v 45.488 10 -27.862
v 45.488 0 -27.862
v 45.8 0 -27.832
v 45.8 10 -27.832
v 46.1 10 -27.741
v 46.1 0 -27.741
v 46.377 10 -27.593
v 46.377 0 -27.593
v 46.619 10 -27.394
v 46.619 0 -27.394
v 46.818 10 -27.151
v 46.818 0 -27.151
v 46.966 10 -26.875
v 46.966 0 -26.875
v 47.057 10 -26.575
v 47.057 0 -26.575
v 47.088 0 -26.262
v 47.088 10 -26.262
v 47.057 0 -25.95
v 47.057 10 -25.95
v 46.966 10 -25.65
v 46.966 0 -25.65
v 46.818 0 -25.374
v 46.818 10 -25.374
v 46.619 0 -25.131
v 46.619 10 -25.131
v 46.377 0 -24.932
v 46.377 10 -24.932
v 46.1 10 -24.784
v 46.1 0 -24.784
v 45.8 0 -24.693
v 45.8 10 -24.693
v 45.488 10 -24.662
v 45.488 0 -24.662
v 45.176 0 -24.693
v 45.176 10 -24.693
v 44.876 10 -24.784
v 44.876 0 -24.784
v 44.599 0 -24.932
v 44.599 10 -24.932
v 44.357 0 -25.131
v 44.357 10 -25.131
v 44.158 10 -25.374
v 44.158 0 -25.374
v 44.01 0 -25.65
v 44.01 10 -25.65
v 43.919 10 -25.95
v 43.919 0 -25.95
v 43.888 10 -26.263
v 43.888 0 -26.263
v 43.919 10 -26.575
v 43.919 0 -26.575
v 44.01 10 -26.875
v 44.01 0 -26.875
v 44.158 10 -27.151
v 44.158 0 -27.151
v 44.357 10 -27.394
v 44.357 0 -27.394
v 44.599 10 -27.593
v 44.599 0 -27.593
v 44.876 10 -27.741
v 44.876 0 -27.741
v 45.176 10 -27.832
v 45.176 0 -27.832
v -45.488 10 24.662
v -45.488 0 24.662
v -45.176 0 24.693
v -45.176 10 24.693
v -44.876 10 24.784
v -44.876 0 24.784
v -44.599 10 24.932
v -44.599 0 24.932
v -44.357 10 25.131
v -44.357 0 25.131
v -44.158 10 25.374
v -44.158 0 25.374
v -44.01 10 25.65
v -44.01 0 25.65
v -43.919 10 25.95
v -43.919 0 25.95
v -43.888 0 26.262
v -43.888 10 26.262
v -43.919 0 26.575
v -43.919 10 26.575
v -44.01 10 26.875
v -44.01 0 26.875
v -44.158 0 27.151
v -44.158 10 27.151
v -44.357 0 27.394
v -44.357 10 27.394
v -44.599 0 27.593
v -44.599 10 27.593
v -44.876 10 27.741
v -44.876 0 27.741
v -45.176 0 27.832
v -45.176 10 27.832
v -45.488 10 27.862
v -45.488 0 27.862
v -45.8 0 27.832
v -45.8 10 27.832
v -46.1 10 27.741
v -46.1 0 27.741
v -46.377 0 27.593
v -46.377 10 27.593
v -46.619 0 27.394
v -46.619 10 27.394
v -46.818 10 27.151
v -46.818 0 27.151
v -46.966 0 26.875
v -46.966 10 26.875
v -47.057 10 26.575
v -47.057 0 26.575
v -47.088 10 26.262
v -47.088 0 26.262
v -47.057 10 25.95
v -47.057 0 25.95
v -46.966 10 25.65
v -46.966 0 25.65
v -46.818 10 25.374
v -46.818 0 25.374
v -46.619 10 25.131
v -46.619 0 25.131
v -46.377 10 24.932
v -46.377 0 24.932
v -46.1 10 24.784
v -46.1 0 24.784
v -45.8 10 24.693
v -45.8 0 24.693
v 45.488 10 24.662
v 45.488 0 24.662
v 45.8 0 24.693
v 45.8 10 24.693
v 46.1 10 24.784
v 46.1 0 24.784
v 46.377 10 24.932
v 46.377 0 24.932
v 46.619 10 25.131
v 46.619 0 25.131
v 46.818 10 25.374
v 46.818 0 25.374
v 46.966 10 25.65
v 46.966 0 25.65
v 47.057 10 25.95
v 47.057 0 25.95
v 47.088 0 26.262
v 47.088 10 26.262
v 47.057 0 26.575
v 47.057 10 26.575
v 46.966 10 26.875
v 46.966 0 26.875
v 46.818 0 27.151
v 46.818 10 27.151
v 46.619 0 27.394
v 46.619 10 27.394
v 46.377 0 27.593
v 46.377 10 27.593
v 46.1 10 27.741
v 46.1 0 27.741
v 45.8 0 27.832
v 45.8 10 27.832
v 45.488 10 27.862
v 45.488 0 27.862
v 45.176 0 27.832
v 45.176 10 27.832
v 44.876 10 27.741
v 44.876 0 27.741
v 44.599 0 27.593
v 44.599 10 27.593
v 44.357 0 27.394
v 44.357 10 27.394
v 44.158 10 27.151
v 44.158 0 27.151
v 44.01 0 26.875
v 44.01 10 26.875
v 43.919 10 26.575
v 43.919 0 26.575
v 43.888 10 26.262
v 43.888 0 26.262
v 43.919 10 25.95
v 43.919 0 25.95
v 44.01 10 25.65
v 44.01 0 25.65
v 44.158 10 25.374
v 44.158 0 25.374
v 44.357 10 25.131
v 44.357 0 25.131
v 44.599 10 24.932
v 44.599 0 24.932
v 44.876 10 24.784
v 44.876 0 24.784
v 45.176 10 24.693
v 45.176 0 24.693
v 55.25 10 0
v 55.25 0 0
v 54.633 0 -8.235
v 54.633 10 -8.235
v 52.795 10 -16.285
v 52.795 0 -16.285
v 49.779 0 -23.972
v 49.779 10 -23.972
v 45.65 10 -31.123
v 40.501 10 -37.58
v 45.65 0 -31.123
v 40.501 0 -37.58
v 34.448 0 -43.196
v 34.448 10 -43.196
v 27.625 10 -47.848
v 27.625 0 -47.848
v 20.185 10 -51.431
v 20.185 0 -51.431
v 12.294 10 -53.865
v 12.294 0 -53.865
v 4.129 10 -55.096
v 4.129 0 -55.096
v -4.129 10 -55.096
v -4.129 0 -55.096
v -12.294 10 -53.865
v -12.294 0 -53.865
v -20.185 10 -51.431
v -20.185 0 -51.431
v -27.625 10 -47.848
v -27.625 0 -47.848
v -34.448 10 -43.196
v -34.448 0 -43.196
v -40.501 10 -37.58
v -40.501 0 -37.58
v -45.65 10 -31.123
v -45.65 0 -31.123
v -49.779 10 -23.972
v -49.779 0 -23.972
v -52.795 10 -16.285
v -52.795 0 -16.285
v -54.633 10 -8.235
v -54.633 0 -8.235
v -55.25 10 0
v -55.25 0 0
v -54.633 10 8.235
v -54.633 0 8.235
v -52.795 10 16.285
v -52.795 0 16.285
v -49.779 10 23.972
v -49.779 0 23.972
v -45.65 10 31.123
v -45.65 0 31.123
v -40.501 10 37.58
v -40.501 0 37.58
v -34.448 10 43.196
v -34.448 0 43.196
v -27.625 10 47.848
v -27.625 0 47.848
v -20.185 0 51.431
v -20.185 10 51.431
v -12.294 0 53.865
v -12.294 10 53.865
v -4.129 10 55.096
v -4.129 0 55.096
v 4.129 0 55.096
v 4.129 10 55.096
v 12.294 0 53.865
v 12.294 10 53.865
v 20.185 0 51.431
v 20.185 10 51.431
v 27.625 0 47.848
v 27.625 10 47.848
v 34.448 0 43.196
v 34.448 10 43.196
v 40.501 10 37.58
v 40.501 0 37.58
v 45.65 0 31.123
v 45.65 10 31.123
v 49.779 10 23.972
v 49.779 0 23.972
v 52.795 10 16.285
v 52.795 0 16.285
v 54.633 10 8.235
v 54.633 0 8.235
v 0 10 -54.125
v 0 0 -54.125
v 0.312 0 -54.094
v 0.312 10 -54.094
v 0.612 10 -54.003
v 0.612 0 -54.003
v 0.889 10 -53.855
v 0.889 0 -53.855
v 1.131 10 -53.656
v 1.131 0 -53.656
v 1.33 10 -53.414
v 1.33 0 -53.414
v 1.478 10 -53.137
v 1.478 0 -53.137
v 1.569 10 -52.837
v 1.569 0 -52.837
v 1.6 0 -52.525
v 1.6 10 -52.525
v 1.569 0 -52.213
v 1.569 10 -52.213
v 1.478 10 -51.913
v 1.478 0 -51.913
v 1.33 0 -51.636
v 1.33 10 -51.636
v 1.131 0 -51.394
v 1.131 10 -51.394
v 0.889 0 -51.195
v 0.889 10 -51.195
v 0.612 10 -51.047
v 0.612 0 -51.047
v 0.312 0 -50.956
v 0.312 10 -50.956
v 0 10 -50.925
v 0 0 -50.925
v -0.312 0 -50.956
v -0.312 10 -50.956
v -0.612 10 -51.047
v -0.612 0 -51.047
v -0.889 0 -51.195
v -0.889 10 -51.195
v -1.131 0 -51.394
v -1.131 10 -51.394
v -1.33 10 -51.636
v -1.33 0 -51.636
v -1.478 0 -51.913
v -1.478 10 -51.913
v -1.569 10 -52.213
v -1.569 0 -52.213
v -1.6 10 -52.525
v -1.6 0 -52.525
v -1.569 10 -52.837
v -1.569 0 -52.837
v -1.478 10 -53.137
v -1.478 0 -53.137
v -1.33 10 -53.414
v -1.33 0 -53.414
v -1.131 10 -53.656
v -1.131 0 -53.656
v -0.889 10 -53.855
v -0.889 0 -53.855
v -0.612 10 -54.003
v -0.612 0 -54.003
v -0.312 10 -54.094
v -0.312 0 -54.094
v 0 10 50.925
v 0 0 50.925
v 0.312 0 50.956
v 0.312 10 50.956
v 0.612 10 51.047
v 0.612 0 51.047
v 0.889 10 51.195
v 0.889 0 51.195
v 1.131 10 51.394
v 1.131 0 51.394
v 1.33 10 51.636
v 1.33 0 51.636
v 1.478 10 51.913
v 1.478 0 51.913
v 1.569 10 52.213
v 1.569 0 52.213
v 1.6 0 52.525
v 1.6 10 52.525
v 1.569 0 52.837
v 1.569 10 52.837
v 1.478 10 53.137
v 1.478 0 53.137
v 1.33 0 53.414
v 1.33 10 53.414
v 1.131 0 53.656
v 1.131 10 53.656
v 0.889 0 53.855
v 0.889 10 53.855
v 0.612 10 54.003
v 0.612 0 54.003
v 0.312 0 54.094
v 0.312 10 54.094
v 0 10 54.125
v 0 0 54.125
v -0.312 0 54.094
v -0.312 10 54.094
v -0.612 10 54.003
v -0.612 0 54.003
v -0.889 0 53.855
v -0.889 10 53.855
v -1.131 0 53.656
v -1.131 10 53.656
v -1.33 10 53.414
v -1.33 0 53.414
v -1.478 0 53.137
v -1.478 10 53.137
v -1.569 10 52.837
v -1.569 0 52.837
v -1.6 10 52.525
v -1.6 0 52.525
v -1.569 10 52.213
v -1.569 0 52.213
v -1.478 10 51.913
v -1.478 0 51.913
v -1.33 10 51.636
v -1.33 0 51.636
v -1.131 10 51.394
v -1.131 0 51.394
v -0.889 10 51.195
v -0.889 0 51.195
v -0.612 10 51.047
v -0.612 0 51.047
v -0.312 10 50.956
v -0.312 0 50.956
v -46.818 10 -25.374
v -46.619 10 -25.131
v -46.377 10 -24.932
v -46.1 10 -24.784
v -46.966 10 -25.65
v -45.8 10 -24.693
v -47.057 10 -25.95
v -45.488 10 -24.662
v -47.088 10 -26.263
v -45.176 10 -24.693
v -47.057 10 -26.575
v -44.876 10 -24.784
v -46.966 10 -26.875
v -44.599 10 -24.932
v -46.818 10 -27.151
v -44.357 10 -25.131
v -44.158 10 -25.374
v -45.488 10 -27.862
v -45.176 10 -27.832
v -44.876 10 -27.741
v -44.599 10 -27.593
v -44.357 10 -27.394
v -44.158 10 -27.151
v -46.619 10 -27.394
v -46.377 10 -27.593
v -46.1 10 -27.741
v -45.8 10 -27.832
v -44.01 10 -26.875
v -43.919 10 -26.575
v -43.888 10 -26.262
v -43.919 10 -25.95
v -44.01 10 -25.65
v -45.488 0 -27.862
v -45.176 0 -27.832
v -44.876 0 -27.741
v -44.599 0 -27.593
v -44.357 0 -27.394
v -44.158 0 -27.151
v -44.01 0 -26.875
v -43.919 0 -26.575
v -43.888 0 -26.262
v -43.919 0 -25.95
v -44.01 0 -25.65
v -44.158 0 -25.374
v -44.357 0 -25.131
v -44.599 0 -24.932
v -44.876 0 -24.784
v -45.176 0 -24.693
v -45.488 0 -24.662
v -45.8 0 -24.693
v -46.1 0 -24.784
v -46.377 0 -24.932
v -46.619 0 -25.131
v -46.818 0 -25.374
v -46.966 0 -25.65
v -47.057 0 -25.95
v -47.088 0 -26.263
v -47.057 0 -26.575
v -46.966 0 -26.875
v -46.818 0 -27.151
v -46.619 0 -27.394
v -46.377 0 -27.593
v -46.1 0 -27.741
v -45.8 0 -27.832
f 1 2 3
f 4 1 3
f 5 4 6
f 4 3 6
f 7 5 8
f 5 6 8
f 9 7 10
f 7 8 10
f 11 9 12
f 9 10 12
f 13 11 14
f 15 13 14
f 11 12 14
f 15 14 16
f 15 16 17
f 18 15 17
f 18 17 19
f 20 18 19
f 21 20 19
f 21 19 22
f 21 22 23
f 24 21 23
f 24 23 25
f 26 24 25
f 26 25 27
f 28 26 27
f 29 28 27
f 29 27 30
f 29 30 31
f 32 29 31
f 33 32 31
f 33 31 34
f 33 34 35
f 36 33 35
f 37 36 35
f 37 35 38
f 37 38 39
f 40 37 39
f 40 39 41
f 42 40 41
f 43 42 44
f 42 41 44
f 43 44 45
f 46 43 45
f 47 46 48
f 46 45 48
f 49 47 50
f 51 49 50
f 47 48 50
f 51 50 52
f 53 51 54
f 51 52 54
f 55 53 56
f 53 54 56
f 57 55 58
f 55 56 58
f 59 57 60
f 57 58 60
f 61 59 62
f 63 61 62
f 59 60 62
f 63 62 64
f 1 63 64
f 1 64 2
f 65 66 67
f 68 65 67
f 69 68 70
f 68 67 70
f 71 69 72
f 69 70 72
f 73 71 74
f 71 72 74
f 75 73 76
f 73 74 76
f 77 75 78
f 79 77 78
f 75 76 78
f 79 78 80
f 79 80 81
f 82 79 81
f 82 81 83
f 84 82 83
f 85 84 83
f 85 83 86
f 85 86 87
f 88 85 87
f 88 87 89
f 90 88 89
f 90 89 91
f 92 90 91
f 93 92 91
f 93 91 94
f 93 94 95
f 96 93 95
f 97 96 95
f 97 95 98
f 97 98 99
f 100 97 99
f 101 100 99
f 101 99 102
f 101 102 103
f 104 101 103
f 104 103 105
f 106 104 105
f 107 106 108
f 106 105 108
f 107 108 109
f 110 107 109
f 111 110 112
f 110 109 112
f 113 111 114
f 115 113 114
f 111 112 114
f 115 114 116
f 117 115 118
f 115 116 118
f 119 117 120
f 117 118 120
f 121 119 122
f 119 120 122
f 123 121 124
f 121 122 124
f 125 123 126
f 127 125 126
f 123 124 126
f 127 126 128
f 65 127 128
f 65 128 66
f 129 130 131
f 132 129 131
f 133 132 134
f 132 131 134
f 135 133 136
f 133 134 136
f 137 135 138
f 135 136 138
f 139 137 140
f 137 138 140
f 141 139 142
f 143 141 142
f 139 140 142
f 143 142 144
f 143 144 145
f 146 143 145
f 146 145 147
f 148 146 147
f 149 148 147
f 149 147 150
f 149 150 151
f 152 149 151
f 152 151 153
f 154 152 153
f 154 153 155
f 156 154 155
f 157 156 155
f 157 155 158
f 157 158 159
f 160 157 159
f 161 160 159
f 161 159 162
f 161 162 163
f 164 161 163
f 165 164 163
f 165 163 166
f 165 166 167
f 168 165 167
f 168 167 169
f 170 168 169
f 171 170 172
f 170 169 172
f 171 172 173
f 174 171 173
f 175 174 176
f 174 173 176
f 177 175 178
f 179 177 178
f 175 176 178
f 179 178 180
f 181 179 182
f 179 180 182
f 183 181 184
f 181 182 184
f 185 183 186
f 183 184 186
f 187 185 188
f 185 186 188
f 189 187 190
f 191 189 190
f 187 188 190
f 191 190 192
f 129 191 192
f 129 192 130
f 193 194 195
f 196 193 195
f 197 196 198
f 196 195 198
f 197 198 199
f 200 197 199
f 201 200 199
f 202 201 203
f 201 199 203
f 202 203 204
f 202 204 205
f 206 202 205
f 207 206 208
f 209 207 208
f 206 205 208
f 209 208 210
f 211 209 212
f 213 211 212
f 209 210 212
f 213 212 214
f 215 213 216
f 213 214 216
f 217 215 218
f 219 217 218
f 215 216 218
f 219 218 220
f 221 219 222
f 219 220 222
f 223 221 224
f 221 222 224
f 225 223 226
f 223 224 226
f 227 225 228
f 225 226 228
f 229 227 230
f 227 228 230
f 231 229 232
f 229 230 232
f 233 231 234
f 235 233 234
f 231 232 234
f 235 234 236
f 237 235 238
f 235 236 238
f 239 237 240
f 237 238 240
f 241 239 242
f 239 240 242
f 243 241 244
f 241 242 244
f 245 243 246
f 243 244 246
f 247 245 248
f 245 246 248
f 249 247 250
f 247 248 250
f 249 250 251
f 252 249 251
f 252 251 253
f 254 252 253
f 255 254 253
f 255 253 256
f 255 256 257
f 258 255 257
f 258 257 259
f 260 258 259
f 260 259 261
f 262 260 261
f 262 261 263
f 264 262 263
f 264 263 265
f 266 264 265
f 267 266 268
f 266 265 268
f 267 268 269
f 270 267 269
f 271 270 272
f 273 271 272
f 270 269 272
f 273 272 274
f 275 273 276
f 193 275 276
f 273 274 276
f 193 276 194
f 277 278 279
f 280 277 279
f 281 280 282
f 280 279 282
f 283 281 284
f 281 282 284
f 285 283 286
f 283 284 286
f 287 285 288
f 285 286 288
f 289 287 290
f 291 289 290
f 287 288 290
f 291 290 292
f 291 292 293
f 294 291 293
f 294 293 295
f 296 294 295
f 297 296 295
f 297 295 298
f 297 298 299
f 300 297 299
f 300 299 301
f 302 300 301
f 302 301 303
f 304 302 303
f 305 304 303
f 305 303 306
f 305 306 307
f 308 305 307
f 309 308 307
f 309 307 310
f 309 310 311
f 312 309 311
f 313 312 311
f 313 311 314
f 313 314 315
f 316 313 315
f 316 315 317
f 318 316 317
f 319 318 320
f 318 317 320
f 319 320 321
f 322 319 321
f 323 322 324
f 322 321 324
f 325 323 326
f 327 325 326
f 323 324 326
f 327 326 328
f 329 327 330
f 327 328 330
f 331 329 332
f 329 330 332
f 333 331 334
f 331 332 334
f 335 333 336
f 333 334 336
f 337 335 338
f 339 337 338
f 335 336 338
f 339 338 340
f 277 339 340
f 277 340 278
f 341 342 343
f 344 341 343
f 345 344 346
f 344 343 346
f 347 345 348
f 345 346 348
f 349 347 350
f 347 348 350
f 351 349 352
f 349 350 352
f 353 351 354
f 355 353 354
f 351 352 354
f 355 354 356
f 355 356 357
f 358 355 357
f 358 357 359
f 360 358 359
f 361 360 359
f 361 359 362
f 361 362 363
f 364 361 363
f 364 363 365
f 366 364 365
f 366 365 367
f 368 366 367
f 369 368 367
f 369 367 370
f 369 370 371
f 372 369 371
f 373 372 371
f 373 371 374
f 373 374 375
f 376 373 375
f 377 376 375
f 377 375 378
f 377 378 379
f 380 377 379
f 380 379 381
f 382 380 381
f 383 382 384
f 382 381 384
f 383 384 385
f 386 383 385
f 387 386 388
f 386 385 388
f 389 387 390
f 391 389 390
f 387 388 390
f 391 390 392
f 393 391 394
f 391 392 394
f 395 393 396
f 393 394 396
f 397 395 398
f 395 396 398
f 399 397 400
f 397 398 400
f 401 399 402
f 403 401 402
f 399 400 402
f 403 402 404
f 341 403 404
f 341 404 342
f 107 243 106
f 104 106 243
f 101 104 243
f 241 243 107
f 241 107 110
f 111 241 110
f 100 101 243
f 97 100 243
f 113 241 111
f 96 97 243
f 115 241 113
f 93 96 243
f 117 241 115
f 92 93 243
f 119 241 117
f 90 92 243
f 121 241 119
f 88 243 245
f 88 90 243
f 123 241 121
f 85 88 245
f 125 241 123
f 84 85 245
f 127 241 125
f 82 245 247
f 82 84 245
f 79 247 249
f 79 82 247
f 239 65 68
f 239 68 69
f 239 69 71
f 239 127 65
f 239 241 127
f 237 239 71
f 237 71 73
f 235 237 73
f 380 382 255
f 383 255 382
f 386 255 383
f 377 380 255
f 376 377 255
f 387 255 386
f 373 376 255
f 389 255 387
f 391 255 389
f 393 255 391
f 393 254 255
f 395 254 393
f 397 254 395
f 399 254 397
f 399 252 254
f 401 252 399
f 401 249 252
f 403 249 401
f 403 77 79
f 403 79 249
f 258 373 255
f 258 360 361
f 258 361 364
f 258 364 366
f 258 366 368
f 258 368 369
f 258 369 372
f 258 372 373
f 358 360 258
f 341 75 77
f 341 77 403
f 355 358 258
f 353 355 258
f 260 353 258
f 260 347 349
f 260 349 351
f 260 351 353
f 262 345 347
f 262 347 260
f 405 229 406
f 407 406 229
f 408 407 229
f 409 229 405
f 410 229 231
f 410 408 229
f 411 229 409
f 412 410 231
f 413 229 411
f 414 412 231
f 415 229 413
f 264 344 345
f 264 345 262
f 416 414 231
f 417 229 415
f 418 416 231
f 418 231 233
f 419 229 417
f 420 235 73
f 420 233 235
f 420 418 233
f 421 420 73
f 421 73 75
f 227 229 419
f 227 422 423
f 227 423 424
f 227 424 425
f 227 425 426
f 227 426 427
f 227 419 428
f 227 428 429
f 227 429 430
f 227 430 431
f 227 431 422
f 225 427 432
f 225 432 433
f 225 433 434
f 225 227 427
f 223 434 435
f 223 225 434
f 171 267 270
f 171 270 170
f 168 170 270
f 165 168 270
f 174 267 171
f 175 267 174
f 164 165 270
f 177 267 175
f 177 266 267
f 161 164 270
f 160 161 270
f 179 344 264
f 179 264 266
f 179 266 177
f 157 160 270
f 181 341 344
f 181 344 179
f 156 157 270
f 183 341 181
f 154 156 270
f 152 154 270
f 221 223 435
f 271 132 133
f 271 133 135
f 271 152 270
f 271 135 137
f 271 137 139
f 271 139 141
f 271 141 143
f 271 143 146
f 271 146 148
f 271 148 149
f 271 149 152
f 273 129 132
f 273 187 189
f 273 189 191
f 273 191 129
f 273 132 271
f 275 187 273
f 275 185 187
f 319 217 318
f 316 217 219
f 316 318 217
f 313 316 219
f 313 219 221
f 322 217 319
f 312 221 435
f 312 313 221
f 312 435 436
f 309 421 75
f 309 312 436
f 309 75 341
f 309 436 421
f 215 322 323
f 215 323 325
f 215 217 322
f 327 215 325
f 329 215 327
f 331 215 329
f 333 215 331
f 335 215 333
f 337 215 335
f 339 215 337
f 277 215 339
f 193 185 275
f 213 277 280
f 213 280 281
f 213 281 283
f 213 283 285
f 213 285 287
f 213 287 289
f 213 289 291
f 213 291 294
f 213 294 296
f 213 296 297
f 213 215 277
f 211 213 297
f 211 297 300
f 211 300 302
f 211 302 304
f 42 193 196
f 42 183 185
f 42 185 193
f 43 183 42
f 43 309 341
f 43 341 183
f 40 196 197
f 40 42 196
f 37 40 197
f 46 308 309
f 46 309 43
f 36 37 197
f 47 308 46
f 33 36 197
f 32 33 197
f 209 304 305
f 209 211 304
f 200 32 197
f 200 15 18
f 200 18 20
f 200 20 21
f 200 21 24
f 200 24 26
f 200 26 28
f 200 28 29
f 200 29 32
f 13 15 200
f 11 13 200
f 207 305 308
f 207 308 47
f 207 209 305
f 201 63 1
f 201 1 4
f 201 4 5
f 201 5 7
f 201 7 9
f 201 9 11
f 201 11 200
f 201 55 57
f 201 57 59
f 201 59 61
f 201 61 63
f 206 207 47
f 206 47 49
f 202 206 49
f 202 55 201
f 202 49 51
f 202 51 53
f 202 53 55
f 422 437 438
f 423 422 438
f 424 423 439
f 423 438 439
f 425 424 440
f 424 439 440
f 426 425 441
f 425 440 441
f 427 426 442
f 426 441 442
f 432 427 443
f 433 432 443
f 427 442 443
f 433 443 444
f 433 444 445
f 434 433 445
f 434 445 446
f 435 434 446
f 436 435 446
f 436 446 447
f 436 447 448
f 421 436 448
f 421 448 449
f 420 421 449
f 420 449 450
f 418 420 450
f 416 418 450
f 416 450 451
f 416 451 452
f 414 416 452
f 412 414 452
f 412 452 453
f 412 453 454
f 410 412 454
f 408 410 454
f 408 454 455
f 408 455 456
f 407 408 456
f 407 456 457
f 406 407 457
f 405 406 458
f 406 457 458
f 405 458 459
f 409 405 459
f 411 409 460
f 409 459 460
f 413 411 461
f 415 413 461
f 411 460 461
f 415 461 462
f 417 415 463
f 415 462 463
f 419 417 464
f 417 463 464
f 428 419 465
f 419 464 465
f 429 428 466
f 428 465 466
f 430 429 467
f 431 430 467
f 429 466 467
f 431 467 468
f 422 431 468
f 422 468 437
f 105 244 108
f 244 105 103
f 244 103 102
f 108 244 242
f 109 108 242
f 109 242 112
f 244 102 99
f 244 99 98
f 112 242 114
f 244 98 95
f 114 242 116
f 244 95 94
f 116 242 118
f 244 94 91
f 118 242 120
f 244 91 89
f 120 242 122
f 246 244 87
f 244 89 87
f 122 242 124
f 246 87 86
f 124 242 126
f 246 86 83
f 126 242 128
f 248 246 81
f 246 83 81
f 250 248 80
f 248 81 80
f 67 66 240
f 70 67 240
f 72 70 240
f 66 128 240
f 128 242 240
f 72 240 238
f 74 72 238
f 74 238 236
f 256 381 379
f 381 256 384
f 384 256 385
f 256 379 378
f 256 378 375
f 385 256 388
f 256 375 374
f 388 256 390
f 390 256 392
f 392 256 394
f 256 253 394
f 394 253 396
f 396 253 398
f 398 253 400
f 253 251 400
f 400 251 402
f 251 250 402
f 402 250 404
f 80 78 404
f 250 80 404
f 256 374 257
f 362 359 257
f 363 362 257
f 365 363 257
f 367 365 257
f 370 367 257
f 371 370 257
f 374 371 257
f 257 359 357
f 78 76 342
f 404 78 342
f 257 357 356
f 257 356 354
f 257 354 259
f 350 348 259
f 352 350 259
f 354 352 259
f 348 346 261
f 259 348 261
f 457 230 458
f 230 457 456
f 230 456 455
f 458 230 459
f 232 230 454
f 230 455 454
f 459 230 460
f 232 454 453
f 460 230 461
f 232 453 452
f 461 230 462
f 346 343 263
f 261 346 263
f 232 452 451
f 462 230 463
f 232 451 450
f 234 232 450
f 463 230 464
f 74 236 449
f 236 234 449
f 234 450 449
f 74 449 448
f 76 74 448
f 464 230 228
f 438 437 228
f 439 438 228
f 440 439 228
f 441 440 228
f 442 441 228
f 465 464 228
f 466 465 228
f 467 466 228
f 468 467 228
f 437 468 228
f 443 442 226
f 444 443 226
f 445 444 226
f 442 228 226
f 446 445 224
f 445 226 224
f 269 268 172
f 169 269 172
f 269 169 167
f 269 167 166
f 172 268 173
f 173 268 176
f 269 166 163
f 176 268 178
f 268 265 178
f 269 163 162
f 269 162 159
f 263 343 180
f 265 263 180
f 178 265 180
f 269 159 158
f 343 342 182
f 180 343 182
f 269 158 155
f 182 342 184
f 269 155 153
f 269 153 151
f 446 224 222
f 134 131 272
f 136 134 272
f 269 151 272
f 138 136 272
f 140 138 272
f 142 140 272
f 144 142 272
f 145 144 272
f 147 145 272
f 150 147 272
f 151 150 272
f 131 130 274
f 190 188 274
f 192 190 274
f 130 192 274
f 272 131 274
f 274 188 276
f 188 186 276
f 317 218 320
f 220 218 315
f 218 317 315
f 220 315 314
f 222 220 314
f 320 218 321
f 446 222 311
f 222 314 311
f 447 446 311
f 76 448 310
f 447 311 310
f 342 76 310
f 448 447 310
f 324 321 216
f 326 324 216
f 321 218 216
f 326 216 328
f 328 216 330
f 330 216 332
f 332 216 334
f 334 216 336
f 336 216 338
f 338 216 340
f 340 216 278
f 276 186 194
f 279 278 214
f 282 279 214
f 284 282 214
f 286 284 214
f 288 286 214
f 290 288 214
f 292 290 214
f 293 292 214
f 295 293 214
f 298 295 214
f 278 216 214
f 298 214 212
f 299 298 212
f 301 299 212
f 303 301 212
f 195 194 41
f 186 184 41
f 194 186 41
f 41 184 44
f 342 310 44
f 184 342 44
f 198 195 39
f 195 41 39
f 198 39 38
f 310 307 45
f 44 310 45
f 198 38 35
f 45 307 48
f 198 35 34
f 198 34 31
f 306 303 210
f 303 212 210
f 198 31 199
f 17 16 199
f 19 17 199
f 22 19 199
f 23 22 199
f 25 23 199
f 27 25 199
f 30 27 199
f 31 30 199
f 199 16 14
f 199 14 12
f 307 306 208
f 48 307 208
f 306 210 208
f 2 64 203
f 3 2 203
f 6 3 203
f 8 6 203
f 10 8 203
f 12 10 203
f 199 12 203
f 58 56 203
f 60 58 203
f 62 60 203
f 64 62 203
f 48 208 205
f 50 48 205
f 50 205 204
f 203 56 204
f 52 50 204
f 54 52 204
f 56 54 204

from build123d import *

# Parameters (mm, degrees)
SKETCH_1_R              = 55.25
EXTRUDE_1_DEPTH         = 10
HOLE_WIZARD_3_2_3_2_1_D = 3.2


with BuildPart() as part:
    # 草图1 → 凸台-拉伸1 (new body)
    with BuildSketch(Plane(origin=(0, 0, 0), x_dir=(1, 0, 0), z_dir=(0, 1, 0))):
        Circle(SKETCH_1_R)
    extrude(amount=EXTRUDE_1_DEPTH)

    # Ø3.2 (3.2) 直径孔1 (through all)
    with Locations(Plane(origin=(0, 10, -52.525), x_dir=(0, 0, 1), z_dir=(0, 1, 0))):
        with Locations((0, 0), (26.2625, -45.487984334), (78.7875, -45.487984334), (105.05, 0), (78.7875, 45.487984334), (26.2625, 45.487984334)):
            Hole(HOLE_WIZARD_3_2_3_2_1_D / 2)


solid = part.part
